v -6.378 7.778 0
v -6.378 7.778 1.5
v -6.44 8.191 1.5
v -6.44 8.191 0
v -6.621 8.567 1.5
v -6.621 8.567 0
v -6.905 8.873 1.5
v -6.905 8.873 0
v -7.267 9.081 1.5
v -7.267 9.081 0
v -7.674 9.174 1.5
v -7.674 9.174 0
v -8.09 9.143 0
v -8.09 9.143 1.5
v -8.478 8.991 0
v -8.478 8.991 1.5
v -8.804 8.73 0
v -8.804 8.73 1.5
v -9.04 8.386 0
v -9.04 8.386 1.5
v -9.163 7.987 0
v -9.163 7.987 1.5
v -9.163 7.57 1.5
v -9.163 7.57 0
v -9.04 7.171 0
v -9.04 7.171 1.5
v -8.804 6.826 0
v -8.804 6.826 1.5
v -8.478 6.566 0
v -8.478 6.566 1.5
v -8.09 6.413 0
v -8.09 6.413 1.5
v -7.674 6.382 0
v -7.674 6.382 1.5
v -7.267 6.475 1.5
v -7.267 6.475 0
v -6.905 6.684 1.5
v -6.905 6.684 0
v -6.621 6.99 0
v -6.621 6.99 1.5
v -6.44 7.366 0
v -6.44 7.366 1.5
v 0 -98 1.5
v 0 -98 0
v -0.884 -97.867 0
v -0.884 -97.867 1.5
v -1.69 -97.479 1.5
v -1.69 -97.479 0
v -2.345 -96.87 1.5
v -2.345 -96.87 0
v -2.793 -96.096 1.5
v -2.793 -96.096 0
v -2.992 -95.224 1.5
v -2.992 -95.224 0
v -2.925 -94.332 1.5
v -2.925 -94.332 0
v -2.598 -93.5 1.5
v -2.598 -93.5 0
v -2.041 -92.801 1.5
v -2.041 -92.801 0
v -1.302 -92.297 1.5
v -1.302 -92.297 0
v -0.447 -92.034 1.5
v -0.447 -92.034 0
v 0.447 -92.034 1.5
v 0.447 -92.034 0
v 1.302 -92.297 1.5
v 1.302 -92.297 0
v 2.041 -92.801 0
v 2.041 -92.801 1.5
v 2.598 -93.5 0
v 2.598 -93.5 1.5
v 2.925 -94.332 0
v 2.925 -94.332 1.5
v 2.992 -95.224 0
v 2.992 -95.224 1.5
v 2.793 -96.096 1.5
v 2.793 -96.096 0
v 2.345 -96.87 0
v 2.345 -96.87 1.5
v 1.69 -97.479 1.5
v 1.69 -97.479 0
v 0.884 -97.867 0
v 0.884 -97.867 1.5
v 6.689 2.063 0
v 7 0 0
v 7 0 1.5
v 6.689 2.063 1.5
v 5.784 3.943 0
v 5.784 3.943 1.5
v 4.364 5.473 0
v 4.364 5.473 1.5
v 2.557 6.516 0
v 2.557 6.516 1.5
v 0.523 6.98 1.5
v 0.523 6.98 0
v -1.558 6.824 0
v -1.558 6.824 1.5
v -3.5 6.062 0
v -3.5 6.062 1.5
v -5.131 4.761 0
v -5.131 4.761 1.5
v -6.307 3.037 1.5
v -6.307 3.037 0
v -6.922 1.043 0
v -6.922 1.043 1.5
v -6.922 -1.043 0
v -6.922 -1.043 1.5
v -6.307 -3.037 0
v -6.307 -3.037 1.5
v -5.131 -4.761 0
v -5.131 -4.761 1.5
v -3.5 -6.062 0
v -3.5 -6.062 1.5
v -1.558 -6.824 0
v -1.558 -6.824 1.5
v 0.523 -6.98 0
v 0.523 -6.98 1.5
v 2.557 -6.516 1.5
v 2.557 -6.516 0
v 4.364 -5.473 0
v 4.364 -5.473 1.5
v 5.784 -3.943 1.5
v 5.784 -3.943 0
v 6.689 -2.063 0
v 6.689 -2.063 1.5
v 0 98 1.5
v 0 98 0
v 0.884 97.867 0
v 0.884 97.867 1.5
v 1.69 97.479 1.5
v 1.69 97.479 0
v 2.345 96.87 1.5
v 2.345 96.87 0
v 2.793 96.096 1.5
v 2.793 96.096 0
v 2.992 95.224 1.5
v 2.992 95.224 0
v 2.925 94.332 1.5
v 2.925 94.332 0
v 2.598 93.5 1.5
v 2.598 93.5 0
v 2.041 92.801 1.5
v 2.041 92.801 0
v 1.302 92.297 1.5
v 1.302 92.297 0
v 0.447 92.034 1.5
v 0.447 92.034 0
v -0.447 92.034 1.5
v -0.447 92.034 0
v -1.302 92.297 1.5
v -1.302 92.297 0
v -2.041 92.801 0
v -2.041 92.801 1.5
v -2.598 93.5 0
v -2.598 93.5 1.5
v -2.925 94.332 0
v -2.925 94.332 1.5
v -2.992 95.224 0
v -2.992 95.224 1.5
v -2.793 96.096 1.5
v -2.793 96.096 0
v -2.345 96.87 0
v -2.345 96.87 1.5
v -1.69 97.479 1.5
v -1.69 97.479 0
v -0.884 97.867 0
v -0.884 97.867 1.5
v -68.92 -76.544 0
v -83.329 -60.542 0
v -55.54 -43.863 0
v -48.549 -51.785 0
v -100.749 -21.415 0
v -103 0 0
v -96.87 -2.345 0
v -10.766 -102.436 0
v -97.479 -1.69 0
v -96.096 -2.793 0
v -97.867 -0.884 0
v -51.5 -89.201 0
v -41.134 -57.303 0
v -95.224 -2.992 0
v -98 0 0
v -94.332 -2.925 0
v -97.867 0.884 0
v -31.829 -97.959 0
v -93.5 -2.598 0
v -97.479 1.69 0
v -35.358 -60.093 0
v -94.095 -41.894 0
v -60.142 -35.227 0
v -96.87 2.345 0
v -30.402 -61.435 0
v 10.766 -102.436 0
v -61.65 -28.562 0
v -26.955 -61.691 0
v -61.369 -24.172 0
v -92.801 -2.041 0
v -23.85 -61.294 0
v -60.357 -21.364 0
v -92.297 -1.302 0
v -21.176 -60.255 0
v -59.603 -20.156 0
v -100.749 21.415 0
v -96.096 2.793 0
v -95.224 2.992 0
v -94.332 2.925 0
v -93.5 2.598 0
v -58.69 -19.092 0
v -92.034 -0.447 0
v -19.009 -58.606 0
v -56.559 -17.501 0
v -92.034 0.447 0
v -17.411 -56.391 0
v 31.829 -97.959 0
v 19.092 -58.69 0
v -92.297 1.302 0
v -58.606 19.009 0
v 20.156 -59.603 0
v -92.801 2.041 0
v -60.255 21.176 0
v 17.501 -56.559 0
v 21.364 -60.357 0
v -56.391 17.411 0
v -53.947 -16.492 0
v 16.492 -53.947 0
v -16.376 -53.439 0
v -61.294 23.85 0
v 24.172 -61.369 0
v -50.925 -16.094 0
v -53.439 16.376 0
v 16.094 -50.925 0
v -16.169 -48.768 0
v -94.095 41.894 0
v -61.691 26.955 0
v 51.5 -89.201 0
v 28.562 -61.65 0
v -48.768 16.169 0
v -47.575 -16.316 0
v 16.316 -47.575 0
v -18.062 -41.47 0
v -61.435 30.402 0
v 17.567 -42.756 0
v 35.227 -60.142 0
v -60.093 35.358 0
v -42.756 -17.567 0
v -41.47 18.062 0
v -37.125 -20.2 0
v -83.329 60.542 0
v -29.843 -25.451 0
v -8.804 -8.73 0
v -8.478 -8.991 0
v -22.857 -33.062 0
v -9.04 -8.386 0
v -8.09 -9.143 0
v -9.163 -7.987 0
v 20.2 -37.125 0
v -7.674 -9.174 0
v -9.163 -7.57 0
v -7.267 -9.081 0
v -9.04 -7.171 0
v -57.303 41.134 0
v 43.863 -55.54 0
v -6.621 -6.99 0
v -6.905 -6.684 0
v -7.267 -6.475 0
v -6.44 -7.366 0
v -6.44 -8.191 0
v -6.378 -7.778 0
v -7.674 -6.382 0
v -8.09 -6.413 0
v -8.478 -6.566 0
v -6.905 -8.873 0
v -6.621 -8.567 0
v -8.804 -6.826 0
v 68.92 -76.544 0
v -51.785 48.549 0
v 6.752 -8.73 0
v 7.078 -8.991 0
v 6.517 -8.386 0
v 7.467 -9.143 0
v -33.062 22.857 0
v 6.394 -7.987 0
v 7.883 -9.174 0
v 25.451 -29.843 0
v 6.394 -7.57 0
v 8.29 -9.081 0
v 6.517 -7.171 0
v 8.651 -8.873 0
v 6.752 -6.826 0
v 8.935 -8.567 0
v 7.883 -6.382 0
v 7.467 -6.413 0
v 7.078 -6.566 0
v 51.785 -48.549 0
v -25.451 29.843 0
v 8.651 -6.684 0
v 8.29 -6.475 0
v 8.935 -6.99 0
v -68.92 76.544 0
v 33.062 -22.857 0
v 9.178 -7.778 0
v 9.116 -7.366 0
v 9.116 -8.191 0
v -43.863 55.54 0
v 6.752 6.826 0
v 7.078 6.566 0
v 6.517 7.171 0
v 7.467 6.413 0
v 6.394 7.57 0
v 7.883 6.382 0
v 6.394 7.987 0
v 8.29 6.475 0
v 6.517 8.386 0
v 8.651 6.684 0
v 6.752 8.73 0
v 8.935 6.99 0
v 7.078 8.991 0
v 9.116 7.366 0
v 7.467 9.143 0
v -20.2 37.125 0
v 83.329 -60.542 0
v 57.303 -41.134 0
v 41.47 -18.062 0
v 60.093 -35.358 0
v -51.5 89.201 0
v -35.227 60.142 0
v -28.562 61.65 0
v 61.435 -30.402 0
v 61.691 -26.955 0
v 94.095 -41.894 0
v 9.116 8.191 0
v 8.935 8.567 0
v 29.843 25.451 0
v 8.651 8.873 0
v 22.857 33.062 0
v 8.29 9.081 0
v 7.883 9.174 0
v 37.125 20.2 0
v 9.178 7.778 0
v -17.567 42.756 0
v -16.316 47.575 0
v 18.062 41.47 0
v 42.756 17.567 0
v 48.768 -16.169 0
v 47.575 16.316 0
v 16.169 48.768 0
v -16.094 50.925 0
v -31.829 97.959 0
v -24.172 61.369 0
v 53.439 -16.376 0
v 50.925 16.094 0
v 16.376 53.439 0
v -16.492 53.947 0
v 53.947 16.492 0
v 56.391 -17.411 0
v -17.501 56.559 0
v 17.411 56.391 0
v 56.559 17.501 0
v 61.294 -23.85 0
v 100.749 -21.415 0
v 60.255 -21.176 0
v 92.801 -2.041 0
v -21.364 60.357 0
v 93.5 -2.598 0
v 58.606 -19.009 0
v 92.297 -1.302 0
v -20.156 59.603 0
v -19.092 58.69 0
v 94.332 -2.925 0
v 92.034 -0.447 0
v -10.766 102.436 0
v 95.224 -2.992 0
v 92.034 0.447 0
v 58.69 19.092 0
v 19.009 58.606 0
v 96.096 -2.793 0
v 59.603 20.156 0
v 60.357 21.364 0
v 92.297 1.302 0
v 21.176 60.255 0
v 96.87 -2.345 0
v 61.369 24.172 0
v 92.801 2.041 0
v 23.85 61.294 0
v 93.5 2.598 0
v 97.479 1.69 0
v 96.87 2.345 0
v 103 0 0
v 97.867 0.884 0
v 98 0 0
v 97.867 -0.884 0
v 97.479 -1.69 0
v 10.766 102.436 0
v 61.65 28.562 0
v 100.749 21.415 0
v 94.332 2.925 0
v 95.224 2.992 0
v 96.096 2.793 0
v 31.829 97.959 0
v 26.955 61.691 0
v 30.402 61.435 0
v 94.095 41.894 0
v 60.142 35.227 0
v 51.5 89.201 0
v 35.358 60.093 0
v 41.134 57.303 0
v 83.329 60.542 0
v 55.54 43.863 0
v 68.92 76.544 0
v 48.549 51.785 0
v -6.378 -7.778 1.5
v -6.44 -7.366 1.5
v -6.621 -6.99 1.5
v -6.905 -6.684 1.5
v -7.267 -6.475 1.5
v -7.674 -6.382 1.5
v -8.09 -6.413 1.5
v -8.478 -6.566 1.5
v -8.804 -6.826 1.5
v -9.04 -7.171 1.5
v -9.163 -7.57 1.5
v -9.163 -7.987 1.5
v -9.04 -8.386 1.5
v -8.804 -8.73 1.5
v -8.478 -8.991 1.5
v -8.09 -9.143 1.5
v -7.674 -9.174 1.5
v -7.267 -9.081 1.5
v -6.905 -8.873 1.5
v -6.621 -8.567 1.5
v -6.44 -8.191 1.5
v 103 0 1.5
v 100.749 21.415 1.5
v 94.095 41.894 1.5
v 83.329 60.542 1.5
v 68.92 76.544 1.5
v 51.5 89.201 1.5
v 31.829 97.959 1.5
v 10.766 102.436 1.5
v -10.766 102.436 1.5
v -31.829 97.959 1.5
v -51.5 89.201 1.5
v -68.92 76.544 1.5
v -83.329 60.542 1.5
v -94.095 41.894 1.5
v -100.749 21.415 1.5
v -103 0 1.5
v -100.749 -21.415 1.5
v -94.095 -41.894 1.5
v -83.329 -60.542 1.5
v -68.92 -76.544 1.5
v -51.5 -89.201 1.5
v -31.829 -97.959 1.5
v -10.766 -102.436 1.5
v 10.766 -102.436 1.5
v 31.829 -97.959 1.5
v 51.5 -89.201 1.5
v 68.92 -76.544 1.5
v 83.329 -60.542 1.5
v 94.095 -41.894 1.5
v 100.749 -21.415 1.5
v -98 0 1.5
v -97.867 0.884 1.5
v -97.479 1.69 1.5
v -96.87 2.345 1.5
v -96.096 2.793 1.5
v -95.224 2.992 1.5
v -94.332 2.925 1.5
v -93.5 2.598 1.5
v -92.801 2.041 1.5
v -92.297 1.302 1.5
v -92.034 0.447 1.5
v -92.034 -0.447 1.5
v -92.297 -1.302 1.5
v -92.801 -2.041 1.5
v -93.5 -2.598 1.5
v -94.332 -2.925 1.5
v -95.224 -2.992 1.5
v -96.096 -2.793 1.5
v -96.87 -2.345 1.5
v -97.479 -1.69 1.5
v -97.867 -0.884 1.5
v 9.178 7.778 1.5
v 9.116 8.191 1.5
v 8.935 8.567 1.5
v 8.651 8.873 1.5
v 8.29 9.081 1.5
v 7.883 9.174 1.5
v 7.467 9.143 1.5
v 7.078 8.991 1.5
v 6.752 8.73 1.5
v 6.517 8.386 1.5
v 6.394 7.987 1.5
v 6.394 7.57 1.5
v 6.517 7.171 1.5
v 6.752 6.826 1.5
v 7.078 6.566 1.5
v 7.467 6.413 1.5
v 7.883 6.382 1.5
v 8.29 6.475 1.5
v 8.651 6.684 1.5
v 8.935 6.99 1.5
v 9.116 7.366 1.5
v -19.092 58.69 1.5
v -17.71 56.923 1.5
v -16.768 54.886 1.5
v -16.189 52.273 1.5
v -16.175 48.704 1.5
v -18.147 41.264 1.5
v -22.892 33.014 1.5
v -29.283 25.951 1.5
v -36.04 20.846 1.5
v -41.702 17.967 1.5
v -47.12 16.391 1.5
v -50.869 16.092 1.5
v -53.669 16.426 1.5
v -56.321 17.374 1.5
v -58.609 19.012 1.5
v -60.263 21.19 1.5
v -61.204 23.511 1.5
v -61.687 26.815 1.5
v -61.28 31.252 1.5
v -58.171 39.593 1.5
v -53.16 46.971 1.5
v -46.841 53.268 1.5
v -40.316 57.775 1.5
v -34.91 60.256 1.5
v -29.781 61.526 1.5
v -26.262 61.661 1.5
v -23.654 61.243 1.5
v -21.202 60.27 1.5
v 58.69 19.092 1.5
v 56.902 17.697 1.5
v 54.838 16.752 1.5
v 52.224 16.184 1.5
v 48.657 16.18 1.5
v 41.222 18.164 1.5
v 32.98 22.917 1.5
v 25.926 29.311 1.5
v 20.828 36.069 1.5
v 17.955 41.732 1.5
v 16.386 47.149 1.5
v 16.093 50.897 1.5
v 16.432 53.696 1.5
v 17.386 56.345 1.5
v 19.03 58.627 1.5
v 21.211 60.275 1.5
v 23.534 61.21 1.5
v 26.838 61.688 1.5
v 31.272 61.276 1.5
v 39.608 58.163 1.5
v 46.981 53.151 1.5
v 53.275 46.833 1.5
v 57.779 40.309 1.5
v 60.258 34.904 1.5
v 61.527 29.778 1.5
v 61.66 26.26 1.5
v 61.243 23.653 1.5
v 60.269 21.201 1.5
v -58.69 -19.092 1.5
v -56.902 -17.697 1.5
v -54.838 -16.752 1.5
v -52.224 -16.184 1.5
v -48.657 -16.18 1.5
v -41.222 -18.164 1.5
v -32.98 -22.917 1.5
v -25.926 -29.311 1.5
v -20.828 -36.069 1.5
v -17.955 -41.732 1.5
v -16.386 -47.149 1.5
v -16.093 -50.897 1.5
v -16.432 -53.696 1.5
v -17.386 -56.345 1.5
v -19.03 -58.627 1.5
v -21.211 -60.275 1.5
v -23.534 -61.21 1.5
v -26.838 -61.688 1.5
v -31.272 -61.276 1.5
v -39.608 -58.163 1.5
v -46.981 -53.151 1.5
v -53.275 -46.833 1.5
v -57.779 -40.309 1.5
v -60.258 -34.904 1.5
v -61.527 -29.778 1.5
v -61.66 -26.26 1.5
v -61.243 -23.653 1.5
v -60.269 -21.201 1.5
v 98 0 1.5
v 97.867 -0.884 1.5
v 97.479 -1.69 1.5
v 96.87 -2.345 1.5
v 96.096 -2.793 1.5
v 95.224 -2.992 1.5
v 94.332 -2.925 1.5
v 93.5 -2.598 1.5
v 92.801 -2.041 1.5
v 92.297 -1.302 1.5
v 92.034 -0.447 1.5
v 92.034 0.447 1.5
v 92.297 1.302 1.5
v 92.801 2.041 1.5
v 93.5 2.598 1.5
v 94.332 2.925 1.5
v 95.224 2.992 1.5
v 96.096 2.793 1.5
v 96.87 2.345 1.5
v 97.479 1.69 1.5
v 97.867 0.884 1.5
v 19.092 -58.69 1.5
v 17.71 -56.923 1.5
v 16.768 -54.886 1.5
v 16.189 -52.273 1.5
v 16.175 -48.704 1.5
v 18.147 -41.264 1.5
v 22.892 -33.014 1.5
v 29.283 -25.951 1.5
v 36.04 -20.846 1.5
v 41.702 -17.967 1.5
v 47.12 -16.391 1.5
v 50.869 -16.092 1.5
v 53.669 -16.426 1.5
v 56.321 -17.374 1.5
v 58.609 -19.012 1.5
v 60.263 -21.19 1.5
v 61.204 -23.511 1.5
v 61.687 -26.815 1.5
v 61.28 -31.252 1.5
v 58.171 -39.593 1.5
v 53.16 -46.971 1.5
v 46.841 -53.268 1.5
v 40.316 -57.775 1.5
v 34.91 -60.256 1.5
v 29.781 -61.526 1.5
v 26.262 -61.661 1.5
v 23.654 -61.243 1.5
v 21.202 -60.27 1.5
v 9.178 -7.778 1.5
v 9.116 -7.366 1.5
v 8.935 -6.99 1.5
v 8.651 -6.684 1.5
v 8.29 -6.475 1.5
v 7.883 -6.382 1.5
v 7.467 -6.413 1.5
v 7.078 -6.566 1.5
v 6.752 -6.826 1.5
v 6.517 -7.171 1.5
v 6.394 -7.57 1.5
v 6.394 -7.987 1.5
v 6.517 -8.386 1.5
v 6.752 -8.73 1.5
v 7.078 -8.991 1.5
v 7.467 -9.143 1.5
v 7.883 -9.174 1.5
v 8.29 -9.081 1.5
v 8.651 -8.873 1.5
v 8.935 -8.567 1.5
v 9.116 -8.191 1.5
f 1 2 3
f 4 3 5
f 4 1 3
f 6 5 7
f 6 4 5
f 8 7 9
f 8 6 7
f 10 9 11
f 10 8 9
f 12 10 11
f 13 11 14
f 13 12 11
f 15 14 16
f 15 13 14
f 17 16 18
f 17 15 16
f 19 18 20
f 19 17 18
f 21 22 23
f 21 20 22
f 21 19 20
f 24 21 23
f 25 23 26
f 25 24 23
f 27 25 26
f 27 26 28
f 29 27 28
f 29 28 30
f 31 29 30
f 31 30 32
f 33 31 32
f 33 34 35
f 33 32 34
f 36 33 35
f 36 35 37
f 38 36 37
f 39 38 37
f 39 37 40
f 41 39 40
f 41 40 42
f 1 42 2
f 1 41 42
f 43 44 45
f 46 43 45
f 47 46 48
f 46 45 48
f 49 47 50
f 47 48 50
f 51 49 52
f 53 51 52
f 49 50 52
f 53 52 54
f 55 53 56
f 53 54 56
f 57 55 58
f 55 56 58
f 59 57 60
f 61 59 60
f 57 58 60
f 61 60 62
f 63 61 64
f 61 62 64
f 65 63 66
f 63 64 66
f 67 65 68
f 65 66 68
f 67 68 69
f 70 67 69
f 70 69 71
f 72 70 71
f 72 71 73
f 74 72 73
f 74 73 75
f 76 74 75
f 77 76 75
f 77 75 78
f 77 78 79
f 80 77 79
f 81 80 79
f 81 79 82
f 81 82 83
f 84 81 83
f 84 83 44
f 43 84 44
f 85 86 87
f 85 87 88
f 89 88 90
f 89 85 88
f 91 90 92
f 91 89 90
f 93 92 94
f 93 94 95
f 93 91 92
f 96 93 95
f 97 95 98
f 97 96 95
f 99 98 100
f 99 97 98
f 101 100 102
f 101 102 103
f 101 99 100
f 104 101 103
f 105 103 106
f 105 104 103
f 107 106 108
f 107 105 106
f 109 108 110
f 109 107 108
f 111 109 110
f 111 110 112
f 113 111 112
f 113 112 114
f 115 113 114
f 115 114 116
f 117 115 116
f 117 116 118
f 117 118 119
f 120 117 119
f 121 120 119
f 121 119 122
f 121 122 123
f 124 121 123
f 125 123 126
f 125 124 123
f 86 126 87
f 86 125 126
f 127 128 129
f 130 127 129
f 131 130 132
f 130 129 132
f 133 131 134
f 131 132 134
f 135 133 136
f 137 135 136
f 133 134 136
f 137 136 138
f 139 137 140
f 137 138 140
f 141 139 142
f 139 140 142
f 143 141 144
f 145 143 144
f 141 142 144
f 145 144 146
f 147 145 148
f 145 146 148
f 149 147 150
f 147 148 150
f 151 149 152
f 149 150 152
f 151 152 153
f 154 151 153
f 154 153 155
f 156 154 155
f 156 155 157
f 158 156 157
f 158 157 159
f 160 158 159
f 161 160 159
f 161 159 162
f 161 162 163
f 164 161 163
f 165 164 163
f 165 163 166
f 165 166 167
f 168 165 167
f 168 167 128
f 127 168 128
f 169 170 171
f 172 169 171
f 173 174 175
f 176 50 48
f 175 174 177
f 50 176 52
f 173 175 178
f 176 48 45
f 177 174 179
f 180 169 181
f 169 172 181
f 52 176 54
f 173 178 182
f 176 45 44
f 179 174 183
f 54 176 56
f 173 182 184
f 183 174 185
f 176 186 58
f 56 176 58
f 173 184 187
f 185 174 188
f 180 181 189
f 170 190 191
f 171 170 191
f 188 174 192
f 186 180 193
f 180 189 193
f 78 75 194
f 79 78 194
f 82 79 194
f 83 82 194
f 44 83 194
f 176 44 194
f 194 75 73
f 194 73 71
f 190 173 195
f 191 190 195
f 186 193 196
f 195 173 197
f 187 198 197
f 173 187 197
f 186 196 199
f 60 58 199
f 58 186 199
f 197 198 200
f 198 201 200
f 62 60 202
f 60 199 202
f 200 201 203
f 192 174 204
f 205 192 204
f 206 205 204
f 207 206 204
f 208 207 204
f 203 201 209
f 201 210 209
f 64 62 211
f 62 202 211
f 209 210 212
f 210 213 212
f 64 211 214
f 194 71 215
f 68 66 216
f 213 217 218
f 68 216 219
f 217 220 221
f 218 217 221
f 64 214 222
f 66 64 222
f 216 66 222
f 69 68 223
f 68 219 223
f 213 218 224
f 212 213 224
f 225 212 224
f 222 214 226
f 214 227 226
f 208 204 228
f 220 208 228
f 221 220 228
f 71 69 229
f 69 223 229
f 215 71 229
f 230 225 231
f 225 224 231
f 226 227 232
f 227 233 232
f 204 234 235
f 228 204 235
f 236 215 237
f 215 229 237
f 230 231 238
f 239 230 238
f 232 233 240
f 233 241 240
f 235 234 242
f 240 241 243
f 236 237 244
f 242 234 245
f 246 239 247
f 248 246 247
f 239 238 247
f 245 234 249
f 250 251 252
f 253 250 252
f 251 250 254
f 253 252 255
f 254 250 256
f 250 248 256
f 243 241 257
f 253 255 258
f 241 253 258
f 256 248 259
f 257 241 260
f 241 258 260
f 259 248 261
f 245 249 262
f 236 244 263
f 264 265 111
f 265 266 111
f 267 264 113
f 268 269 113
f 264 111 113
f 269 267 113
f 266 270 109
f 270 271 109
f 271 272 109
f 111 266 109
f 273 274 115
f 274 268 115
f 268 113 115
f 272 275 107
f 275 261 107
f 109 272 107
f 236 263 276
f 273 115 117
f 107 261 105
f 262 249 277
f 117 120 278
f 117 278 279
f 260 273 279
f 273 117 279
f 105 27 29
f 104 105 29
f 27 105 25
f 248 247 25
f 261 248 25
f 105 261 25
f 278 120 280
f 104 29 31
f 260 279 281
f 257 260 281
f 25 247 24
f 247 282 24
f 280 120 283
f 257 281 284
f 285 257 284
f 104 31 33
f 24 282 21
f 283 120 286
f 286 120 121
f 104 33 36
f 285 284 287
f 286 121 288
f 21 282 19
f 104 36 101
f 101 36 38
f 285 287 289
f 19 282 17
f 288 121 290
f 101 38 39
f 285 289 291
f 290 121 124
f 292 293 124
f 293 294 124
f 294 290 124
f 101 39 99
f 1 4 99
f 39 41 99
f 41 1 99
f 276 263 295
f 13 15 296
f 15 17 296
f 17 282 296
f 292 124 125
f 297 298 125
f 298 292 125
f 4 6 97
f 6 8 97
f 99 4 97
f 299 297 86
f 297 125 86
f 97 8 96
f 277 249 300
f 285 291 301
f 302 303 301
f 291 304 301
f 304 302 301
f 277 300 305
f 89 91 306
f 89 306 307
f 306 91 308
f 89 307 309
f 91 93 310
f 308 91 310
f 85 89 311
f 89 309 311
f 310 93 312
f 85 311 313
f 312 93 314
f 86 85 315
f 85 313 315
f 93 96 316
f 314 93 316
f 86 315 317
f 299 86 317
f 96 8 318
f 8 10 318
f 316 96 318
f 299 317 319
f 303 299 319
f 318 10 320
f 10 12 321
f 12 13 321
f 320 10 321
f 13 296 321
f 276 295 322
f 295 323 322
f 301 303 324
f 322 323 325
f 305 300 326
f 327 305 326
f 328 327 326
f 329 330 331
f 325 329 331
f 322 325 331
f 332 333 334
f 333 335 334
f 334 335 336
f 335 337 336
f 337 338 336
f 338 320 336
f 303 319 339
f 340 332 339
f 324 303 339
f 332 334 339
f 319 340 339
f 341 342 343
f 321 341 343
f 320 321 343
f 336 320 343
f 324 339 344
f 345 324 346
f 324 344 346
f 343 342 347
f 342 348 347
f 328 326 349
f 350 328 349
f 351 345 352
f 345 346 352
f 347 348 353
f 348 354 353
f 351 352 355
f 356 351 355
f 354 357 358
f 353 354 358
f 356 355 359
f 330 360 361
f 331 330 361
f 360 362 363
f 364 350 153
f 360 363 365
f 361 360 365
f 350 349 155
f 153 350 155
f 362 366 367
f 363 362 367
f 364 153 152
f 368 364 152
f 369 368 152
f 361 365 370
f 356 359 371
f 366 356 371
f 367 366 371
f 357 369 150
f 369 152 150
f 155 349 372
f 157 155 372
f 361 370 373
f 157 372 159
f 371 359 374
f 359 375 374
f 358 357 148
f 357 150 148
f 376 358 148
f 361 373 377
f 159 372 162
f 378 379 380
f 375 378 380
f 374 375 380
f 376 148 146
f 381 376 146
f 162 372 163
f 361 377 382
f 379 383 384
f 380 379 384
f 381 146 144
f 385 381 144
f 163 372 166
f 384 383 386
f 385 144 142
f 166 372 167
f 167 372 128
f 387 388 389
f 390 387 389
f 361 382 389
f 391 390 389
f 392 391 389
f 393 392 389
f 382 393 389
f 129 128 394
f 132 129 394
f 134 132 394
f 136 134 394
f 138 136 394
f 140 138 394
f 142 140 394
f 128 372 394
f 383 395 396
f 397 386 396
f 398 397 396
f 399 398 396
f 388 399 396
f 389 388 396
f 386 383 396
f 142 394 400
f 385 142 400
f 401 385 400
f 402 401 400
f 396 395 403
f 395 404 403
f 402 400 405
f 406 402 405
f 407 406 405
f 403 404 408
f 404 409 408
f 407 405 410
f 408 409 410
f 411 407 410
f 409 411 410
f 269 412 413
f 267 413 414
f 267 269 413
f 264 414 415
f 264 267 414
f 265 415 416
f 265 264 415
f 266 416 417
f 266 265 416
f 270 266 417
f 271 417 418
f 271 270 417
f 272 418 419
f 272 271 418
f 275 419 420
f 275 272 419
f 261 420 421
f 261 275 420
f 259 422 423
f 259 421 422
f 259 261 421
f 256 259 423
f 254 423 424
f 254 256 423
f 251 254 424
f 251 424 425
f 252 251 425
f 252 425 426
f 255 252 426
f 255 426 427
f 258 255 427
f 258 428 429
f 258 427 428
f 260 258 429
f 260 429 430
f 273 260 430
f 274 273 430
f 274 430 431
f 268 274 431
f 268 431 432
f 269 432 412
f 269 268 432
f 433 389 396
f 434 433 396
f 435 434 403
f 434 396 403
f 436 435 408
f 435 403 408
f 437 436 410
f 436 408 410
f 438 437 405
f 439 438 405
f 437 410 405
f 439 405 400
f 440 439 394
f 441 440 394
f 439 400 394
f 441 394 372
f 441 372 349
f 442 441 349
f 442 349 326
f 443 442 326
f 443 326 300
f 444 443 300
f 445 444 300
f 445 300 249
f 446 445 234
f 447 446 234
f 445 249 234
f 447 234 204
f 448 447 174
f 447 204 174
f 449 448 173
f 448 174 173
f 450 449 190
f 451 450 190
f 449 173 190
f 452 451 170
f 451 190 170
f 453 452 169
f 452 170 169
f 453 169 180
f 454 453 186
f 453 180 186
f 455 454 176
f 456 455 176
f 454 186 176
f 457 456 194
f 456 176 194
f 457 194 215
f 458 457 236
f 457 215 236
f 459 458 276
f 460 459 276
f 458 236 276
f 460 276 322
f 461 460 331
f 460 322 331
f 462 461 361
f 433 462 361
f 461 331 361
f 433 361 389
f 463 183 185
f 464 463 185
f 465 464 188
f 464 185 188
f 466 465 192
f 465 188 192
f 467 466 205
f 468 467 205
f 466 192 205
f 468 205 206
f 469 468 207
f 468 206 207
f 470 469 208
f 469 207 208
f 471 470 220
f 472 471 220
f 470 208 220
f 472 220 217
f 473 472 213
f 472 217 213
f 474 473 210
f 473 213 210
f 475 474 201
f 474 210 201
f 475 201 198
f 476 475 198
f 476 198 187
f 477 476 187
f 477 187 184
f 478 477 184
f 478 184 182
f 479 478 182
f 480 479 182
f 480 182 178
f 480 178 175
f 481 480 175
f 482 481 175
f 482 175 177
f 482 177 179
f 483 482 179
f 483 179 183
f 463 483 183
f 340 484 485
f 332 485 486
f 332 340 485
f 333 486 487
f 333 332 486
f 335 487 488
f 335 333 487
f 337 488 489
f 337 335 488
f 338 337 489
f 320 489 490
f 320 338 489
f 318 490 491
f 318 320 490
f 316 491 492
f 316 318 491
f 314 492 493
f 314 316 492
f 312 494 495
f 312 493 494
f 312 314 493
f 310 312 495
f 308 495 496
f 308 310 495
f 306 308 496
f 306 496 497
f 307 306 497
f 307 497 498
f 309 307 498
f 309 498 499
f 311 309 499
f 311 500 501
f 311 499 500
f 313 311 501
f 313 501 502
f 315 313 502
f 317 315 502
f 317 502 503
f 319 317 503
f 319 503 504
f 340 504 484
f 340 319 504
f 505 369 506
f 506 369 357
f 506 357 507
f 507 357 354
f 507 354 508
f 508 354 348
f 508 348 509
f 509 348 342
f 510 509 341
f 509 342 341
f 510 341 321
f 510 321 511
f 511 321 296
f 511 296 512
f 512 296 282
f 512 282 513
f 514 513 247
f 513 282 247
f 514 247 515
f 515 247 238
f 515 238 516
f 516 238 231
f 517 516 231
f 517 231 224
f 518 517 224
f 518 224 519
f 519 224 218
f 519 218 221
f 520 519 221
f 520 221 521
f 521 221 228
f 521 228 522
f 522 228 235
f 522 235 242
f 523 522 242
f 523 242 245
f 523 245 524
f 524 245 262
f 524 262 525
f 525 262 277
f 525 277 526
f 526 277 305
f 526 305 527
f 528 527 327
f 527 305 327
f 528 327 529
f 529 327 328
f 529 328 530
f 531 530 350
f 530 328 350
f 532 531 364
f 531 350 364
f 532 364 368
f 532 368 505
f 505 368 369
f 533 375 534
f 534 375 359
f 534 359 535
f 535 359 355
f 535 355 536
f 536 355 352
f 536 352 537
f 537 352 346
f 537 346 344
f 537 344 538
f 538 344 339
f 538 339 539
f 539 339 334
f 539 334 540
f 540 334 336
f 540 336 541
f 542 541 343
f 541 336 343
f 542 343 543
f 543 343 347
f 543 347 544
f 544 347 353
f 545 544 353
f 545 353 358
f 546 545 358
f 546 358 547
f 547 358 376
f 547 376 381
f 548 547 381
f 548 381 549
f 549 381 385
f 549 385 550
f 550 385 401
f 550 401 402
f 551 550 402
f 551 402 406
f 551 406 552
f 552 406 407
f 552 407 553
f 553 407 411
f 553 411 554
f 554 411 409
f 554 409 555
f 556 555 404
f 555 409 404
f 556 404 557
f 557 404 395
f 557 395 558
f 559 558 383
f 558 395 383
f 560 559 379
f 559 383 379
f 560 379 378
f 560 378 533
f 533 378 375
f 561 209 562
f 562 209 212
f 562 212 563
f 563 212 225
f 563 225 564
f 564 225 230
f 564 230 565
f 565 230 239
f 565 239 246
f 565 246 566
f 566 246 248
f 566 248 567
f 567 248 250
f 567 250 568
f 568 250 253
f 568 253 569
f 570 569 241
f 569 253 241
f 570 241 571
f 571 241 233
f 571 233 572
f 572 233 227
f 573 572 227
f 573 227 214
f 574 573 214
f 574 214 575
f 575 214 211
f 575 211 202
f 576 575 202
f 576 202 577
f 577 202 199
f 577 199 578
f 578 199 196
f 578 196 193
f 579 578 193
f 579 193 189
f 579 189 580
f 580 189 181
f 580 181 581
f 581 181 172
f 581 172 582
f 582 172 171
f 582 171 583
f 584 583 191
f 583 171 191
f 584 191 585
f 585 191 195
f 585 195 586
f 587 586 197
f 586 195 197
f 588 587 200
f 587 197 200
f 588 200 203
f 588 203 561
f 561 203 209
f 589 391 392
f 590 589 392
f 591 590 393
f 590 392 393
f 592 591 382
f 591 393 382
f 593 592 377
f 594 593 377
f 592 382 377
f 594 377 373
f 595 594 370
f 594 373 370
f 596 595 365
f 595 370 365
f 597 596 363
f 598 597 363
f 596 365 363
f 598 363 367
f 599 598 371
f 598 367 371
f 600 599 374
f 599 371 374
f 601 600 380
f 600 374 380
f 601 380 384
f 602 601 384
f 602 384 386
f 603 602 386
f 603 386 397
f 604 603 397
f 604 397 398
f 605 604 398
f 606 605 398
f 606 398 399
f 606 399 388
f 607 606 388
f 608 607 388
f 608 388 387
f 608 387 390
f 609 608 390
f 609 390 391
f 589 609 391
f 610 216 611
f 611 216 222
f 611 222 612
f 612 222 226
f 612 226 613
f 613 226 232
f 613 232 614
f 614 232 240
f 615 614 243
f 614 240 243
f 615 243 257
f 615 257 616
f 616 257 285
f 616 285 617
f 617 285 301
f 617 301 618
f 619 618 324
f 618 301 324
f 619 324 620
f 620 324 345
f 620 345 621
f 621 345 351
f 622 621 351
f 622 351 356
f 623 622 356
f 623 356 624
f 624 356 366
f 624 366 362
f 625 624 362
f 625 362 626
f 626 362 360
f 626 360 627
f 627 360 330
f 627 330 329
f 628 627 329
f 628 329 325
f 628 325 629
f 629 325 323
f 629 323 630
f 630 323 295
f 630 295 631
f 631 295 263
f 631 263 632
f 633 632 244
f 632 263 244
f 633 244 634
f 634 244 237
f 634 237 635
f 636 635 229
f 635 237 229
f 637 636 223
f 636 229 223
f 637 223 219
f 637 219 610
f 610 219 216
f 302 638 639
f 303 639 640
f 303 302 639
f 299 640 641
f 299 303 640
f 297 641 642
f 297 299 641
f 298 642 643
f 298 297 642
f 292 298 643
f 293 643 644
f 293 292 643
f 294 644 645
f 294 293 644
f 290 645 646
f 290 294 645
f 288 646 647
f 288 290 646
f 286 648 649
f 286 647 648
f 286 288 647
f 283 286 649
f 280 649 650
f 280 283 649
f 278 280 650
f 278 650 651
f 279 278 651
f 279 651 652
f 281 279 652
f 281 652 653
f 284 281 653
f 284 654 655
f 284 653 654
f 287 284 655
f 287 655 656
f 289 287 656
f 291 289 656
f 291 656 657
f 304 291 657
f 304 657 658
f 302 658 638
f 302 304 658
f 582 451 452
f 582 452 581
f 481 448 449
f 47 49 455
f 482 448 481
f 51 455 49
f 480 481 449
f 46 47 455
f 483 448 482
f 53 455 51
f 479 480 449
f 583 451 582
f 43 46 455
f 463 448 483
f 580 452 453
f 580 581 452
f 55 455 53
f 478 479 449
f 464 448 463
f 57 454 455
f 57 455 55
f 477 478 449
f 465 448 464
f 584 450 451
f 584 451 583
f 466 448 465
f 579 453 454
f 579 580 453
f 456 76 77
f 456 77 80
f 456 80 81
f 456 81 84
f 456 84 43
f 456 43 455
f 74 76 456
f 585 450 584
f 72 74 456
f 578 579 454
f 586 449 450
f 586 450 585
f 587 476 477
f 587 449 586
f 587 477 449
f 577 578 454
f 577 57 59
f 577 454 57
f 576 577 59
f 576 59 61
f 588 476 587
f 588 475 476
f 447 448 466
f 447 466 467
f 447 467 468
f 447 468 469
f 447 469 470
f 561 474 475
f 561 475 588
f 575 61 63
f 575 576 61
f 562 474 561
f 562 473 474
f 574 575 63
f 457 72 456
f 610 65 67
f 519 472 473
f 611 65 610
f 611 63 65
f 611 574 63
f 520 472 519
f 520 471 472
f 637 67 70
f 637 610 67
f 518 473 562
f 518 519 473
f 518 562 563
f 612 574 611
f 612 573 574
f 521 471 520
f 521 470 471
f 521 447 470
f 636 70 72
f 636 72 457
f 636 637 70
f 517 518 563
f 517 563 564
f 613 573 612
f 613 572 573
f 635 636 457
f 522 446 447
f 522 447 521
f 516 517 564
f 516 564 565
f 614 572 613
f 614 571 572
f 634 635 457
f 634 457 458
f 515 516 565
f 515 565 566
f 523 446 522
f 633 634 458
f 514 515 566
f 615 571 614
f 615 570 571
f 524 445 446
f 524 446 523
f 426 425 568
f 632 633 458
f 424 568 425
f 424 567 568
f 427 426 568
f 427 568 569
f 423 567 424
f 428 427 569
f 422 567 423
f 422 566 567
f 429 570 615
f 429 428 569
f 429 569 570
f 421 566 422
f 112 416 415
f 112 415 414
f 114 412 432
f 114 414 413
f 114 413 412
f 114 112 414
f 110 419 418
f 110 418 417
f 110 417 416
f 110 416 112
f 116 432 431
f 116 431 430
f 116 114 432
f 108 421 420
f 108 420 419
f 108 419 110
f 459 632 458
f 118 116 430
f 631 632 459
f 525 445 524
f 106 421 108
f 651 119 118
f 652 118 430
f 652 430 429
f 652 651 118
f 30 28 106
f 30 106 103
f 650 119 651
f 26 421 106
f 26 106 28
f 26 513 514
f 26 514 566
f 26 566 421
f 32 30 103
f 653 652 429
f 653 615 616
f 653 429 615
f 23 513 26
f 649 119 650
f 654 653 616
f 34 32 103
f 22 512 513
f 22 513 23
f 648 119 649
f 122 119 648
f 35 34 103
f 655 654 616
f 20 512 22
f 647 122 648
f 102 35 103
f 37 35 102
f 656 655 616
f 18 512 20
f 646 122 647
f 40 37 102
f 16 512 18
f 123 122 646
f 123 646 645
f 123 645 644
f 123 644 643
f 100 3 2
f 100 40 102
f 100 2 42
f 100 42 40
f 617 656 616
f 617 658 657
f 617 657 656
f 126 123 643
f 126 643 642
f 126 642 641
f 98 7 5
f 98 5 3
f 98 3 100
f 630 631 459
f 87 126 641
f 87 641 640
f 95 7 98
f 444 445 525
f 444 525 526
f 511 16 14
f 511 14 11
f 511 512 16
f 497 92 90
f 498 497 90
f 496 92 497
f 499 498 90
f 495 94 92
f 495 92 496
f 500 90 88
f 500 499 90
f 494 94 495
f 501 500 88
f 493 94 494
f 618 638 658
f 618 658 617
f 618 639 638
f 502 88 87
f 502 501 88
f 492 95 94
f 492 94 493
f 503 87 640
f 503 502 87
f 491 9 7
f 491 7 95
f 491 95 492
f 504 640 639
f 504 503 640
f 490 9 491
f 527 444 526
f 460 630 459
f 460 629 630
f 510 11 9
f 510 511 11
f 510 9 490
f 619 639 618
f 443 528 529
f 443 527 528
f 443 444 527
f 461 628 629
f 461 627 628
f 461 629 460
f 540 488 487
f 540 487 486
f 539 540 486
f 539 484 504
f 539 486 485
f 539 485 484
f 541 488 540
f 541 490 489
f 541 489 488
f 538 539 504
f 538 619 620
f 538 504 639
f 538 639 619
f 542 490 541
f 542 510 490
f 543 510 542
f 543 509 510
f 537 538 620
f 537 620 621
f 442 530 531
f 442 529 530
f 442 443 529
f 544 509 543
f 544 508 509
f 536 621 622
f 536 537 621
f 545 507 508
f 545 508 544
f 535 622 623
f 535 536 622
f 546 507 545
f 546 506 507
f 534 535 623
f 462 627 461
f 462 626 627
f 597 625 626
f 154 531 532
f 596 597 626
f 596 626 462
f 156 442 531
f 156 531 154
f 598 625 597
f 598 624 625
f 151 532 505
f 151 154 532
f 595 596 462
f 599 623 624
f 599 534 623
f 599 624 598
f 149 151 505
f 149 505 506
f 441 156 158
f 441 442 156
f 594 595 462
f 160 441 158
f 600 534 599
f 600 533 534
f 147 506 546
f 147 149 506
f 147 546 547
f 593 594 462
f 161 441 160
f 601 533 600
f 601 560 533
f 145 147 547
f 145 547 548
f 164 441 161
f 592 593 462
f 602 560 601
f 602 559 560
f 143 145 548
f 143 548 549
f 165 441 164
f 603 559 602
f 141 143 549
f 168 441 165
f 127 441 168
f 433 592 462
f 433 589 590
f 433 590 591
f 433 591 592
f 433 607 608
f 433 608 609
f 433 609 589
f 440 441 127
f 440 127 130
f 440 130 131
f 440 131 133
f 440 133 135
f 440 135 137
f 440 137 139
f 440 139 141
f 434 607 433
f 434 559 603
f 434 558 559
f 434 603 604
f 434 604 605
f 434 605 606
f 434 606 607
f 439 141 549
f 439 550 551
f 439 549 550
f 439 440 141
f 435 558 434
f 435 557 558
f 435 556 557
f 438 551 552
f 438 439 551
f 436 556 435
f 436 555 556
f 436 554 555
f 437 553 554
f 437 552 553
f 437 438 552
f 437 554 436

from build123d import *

# Parameters (mm, degrees)
SKETCH1_R                        = 103
BASE_DISC_DEPTH                  = 1.5
SKETCH3_R                        = 3
CUT_EXTRUDE1_DEPTH               = 146.671719973
SKETCH4_RX                       = 28
SKETCH4_RY                       = 16
CUT_EXTRUDE2_DEPTH               = 146.671719973
SKETCH2_R                        = 7.5
CUT_EXTRUDE3_DEPTH               = 146.671720116
CIRPATTERN3_COUNT                = 4
CIRPATTERN4_COUNT                = 4
SKETCH5_R                        = 1.4
CUT_EXTRUDE4_DEPTH               = 146.671720116
SKETCH6_R                        = 7.51
SKETCH6_R_2                      = 7
CENTRE_BORE_CORRECTION_D14_DEPTH = 1.5


with BuildPart() as part:
    # Sketch1 → Base Disc (new body)
    with BuildSketch(Plane.XY):
        Circle(SKETCH1_R)
    extrude(amount=BASE_DISC_DEPTH)

    # Sketch3 → Cut-Extrude1 (cut, through all)
    with BuildSketch(Plane(origin=(0, 0, 0), x_dir=(-1, 0, 0), z_dir=(0, 0, -1))):
        with Locations((95, 0)):
            Circle(SKETCH3_R)
    cut_extrude1 = extrude(amount=-CUT_EXTRUDE1_DEPTH, mode=Mode.SUBTRACT)

    # Sketch4 → Cut-Extrude2 (cut, through all)
    with BuildSketch(Plane(origin=(0, 0, 0), x_dir=(-1, 0, 0), z_dir=(0, 0, -1))):
        with Locations(Location((38.890872965, 38.890872965), (0, 0, 135))):
            Ellipse(SKETCH4_RX, SKETCH4_RY)
    cut_extrude2 = extrude(amount=-CUT_EXTRUDE2_DEPTH, mode=Mode.SUBTRACT)

    # Sketch2 → Cut-Extrude3 (cut, through all)
    with BuildSketch(Plane(origin=(0, 0, 0), x_dir=(-1, 0, 0), z_dir=(0, 0, -1))):
        Circle(SKETCH2_R)
    extrude(amount=-CUT_EXTRUDE3_DEPTH, mode=Mode.SUBTRACT)

    # CirPattern3: Cut-Extrude1 ×4 about axis
    cirpattern3_axis = Axis((0, 0, 0), (0, 0, 1))
    for i in range(1, CIRPATTERN3_COUNT):
        add(cut_extrude1.rotate(cirpattern3_axis, i * 360 / CIRPATTERN3_COUNT), mode=Mode.SUBTRACT)

    # CirPattern4: Cut-Extrude2 ×4 about axis
    cirpattern4_axis = Axis((0, 0, 0), (0, 0, -1))
    for i in range(1, CIRPATTERN4_COUNT):
        add(cut_extrude2.rotate(cirpattern4_axis, i * 360 / CIRPATTERN4_COUNT), mode=Mode.SUBTRACT)

    # Sketch5 → Cut-Extrude4 (cut, through all)
    with BuildSketch(Plane.XY):
        with Locations((-7.778174593, -7.778174593)):
            Circle(SKETCH5_R)
        with Locations((-7.778174593, 7.778174593)):
            Circle(SKETCH5_R)
        with Locations((7.778174593, 7.778174593)):
            Circle(SKETCH5_R)
        with Locations((7.778174593, -7.778174593)):
            Circle(SKETCH5_R)
    extrude(amount=CUT_EXTRUDE4_DEPTH, mode=Mode.SUBTRACT)

    # Sketch6 → Centre_Bore_Correction_D14 (add)
    with BuildSketch(Plane.XY):
        Circle(SKETCH6_R)
        Circle(SKETCH6_R_2, mode=Mode.SUBTRACT)
    extrude(amount=CENTRE_BORE_CORRECTION_D14_DEPTH)


solid = part.part
